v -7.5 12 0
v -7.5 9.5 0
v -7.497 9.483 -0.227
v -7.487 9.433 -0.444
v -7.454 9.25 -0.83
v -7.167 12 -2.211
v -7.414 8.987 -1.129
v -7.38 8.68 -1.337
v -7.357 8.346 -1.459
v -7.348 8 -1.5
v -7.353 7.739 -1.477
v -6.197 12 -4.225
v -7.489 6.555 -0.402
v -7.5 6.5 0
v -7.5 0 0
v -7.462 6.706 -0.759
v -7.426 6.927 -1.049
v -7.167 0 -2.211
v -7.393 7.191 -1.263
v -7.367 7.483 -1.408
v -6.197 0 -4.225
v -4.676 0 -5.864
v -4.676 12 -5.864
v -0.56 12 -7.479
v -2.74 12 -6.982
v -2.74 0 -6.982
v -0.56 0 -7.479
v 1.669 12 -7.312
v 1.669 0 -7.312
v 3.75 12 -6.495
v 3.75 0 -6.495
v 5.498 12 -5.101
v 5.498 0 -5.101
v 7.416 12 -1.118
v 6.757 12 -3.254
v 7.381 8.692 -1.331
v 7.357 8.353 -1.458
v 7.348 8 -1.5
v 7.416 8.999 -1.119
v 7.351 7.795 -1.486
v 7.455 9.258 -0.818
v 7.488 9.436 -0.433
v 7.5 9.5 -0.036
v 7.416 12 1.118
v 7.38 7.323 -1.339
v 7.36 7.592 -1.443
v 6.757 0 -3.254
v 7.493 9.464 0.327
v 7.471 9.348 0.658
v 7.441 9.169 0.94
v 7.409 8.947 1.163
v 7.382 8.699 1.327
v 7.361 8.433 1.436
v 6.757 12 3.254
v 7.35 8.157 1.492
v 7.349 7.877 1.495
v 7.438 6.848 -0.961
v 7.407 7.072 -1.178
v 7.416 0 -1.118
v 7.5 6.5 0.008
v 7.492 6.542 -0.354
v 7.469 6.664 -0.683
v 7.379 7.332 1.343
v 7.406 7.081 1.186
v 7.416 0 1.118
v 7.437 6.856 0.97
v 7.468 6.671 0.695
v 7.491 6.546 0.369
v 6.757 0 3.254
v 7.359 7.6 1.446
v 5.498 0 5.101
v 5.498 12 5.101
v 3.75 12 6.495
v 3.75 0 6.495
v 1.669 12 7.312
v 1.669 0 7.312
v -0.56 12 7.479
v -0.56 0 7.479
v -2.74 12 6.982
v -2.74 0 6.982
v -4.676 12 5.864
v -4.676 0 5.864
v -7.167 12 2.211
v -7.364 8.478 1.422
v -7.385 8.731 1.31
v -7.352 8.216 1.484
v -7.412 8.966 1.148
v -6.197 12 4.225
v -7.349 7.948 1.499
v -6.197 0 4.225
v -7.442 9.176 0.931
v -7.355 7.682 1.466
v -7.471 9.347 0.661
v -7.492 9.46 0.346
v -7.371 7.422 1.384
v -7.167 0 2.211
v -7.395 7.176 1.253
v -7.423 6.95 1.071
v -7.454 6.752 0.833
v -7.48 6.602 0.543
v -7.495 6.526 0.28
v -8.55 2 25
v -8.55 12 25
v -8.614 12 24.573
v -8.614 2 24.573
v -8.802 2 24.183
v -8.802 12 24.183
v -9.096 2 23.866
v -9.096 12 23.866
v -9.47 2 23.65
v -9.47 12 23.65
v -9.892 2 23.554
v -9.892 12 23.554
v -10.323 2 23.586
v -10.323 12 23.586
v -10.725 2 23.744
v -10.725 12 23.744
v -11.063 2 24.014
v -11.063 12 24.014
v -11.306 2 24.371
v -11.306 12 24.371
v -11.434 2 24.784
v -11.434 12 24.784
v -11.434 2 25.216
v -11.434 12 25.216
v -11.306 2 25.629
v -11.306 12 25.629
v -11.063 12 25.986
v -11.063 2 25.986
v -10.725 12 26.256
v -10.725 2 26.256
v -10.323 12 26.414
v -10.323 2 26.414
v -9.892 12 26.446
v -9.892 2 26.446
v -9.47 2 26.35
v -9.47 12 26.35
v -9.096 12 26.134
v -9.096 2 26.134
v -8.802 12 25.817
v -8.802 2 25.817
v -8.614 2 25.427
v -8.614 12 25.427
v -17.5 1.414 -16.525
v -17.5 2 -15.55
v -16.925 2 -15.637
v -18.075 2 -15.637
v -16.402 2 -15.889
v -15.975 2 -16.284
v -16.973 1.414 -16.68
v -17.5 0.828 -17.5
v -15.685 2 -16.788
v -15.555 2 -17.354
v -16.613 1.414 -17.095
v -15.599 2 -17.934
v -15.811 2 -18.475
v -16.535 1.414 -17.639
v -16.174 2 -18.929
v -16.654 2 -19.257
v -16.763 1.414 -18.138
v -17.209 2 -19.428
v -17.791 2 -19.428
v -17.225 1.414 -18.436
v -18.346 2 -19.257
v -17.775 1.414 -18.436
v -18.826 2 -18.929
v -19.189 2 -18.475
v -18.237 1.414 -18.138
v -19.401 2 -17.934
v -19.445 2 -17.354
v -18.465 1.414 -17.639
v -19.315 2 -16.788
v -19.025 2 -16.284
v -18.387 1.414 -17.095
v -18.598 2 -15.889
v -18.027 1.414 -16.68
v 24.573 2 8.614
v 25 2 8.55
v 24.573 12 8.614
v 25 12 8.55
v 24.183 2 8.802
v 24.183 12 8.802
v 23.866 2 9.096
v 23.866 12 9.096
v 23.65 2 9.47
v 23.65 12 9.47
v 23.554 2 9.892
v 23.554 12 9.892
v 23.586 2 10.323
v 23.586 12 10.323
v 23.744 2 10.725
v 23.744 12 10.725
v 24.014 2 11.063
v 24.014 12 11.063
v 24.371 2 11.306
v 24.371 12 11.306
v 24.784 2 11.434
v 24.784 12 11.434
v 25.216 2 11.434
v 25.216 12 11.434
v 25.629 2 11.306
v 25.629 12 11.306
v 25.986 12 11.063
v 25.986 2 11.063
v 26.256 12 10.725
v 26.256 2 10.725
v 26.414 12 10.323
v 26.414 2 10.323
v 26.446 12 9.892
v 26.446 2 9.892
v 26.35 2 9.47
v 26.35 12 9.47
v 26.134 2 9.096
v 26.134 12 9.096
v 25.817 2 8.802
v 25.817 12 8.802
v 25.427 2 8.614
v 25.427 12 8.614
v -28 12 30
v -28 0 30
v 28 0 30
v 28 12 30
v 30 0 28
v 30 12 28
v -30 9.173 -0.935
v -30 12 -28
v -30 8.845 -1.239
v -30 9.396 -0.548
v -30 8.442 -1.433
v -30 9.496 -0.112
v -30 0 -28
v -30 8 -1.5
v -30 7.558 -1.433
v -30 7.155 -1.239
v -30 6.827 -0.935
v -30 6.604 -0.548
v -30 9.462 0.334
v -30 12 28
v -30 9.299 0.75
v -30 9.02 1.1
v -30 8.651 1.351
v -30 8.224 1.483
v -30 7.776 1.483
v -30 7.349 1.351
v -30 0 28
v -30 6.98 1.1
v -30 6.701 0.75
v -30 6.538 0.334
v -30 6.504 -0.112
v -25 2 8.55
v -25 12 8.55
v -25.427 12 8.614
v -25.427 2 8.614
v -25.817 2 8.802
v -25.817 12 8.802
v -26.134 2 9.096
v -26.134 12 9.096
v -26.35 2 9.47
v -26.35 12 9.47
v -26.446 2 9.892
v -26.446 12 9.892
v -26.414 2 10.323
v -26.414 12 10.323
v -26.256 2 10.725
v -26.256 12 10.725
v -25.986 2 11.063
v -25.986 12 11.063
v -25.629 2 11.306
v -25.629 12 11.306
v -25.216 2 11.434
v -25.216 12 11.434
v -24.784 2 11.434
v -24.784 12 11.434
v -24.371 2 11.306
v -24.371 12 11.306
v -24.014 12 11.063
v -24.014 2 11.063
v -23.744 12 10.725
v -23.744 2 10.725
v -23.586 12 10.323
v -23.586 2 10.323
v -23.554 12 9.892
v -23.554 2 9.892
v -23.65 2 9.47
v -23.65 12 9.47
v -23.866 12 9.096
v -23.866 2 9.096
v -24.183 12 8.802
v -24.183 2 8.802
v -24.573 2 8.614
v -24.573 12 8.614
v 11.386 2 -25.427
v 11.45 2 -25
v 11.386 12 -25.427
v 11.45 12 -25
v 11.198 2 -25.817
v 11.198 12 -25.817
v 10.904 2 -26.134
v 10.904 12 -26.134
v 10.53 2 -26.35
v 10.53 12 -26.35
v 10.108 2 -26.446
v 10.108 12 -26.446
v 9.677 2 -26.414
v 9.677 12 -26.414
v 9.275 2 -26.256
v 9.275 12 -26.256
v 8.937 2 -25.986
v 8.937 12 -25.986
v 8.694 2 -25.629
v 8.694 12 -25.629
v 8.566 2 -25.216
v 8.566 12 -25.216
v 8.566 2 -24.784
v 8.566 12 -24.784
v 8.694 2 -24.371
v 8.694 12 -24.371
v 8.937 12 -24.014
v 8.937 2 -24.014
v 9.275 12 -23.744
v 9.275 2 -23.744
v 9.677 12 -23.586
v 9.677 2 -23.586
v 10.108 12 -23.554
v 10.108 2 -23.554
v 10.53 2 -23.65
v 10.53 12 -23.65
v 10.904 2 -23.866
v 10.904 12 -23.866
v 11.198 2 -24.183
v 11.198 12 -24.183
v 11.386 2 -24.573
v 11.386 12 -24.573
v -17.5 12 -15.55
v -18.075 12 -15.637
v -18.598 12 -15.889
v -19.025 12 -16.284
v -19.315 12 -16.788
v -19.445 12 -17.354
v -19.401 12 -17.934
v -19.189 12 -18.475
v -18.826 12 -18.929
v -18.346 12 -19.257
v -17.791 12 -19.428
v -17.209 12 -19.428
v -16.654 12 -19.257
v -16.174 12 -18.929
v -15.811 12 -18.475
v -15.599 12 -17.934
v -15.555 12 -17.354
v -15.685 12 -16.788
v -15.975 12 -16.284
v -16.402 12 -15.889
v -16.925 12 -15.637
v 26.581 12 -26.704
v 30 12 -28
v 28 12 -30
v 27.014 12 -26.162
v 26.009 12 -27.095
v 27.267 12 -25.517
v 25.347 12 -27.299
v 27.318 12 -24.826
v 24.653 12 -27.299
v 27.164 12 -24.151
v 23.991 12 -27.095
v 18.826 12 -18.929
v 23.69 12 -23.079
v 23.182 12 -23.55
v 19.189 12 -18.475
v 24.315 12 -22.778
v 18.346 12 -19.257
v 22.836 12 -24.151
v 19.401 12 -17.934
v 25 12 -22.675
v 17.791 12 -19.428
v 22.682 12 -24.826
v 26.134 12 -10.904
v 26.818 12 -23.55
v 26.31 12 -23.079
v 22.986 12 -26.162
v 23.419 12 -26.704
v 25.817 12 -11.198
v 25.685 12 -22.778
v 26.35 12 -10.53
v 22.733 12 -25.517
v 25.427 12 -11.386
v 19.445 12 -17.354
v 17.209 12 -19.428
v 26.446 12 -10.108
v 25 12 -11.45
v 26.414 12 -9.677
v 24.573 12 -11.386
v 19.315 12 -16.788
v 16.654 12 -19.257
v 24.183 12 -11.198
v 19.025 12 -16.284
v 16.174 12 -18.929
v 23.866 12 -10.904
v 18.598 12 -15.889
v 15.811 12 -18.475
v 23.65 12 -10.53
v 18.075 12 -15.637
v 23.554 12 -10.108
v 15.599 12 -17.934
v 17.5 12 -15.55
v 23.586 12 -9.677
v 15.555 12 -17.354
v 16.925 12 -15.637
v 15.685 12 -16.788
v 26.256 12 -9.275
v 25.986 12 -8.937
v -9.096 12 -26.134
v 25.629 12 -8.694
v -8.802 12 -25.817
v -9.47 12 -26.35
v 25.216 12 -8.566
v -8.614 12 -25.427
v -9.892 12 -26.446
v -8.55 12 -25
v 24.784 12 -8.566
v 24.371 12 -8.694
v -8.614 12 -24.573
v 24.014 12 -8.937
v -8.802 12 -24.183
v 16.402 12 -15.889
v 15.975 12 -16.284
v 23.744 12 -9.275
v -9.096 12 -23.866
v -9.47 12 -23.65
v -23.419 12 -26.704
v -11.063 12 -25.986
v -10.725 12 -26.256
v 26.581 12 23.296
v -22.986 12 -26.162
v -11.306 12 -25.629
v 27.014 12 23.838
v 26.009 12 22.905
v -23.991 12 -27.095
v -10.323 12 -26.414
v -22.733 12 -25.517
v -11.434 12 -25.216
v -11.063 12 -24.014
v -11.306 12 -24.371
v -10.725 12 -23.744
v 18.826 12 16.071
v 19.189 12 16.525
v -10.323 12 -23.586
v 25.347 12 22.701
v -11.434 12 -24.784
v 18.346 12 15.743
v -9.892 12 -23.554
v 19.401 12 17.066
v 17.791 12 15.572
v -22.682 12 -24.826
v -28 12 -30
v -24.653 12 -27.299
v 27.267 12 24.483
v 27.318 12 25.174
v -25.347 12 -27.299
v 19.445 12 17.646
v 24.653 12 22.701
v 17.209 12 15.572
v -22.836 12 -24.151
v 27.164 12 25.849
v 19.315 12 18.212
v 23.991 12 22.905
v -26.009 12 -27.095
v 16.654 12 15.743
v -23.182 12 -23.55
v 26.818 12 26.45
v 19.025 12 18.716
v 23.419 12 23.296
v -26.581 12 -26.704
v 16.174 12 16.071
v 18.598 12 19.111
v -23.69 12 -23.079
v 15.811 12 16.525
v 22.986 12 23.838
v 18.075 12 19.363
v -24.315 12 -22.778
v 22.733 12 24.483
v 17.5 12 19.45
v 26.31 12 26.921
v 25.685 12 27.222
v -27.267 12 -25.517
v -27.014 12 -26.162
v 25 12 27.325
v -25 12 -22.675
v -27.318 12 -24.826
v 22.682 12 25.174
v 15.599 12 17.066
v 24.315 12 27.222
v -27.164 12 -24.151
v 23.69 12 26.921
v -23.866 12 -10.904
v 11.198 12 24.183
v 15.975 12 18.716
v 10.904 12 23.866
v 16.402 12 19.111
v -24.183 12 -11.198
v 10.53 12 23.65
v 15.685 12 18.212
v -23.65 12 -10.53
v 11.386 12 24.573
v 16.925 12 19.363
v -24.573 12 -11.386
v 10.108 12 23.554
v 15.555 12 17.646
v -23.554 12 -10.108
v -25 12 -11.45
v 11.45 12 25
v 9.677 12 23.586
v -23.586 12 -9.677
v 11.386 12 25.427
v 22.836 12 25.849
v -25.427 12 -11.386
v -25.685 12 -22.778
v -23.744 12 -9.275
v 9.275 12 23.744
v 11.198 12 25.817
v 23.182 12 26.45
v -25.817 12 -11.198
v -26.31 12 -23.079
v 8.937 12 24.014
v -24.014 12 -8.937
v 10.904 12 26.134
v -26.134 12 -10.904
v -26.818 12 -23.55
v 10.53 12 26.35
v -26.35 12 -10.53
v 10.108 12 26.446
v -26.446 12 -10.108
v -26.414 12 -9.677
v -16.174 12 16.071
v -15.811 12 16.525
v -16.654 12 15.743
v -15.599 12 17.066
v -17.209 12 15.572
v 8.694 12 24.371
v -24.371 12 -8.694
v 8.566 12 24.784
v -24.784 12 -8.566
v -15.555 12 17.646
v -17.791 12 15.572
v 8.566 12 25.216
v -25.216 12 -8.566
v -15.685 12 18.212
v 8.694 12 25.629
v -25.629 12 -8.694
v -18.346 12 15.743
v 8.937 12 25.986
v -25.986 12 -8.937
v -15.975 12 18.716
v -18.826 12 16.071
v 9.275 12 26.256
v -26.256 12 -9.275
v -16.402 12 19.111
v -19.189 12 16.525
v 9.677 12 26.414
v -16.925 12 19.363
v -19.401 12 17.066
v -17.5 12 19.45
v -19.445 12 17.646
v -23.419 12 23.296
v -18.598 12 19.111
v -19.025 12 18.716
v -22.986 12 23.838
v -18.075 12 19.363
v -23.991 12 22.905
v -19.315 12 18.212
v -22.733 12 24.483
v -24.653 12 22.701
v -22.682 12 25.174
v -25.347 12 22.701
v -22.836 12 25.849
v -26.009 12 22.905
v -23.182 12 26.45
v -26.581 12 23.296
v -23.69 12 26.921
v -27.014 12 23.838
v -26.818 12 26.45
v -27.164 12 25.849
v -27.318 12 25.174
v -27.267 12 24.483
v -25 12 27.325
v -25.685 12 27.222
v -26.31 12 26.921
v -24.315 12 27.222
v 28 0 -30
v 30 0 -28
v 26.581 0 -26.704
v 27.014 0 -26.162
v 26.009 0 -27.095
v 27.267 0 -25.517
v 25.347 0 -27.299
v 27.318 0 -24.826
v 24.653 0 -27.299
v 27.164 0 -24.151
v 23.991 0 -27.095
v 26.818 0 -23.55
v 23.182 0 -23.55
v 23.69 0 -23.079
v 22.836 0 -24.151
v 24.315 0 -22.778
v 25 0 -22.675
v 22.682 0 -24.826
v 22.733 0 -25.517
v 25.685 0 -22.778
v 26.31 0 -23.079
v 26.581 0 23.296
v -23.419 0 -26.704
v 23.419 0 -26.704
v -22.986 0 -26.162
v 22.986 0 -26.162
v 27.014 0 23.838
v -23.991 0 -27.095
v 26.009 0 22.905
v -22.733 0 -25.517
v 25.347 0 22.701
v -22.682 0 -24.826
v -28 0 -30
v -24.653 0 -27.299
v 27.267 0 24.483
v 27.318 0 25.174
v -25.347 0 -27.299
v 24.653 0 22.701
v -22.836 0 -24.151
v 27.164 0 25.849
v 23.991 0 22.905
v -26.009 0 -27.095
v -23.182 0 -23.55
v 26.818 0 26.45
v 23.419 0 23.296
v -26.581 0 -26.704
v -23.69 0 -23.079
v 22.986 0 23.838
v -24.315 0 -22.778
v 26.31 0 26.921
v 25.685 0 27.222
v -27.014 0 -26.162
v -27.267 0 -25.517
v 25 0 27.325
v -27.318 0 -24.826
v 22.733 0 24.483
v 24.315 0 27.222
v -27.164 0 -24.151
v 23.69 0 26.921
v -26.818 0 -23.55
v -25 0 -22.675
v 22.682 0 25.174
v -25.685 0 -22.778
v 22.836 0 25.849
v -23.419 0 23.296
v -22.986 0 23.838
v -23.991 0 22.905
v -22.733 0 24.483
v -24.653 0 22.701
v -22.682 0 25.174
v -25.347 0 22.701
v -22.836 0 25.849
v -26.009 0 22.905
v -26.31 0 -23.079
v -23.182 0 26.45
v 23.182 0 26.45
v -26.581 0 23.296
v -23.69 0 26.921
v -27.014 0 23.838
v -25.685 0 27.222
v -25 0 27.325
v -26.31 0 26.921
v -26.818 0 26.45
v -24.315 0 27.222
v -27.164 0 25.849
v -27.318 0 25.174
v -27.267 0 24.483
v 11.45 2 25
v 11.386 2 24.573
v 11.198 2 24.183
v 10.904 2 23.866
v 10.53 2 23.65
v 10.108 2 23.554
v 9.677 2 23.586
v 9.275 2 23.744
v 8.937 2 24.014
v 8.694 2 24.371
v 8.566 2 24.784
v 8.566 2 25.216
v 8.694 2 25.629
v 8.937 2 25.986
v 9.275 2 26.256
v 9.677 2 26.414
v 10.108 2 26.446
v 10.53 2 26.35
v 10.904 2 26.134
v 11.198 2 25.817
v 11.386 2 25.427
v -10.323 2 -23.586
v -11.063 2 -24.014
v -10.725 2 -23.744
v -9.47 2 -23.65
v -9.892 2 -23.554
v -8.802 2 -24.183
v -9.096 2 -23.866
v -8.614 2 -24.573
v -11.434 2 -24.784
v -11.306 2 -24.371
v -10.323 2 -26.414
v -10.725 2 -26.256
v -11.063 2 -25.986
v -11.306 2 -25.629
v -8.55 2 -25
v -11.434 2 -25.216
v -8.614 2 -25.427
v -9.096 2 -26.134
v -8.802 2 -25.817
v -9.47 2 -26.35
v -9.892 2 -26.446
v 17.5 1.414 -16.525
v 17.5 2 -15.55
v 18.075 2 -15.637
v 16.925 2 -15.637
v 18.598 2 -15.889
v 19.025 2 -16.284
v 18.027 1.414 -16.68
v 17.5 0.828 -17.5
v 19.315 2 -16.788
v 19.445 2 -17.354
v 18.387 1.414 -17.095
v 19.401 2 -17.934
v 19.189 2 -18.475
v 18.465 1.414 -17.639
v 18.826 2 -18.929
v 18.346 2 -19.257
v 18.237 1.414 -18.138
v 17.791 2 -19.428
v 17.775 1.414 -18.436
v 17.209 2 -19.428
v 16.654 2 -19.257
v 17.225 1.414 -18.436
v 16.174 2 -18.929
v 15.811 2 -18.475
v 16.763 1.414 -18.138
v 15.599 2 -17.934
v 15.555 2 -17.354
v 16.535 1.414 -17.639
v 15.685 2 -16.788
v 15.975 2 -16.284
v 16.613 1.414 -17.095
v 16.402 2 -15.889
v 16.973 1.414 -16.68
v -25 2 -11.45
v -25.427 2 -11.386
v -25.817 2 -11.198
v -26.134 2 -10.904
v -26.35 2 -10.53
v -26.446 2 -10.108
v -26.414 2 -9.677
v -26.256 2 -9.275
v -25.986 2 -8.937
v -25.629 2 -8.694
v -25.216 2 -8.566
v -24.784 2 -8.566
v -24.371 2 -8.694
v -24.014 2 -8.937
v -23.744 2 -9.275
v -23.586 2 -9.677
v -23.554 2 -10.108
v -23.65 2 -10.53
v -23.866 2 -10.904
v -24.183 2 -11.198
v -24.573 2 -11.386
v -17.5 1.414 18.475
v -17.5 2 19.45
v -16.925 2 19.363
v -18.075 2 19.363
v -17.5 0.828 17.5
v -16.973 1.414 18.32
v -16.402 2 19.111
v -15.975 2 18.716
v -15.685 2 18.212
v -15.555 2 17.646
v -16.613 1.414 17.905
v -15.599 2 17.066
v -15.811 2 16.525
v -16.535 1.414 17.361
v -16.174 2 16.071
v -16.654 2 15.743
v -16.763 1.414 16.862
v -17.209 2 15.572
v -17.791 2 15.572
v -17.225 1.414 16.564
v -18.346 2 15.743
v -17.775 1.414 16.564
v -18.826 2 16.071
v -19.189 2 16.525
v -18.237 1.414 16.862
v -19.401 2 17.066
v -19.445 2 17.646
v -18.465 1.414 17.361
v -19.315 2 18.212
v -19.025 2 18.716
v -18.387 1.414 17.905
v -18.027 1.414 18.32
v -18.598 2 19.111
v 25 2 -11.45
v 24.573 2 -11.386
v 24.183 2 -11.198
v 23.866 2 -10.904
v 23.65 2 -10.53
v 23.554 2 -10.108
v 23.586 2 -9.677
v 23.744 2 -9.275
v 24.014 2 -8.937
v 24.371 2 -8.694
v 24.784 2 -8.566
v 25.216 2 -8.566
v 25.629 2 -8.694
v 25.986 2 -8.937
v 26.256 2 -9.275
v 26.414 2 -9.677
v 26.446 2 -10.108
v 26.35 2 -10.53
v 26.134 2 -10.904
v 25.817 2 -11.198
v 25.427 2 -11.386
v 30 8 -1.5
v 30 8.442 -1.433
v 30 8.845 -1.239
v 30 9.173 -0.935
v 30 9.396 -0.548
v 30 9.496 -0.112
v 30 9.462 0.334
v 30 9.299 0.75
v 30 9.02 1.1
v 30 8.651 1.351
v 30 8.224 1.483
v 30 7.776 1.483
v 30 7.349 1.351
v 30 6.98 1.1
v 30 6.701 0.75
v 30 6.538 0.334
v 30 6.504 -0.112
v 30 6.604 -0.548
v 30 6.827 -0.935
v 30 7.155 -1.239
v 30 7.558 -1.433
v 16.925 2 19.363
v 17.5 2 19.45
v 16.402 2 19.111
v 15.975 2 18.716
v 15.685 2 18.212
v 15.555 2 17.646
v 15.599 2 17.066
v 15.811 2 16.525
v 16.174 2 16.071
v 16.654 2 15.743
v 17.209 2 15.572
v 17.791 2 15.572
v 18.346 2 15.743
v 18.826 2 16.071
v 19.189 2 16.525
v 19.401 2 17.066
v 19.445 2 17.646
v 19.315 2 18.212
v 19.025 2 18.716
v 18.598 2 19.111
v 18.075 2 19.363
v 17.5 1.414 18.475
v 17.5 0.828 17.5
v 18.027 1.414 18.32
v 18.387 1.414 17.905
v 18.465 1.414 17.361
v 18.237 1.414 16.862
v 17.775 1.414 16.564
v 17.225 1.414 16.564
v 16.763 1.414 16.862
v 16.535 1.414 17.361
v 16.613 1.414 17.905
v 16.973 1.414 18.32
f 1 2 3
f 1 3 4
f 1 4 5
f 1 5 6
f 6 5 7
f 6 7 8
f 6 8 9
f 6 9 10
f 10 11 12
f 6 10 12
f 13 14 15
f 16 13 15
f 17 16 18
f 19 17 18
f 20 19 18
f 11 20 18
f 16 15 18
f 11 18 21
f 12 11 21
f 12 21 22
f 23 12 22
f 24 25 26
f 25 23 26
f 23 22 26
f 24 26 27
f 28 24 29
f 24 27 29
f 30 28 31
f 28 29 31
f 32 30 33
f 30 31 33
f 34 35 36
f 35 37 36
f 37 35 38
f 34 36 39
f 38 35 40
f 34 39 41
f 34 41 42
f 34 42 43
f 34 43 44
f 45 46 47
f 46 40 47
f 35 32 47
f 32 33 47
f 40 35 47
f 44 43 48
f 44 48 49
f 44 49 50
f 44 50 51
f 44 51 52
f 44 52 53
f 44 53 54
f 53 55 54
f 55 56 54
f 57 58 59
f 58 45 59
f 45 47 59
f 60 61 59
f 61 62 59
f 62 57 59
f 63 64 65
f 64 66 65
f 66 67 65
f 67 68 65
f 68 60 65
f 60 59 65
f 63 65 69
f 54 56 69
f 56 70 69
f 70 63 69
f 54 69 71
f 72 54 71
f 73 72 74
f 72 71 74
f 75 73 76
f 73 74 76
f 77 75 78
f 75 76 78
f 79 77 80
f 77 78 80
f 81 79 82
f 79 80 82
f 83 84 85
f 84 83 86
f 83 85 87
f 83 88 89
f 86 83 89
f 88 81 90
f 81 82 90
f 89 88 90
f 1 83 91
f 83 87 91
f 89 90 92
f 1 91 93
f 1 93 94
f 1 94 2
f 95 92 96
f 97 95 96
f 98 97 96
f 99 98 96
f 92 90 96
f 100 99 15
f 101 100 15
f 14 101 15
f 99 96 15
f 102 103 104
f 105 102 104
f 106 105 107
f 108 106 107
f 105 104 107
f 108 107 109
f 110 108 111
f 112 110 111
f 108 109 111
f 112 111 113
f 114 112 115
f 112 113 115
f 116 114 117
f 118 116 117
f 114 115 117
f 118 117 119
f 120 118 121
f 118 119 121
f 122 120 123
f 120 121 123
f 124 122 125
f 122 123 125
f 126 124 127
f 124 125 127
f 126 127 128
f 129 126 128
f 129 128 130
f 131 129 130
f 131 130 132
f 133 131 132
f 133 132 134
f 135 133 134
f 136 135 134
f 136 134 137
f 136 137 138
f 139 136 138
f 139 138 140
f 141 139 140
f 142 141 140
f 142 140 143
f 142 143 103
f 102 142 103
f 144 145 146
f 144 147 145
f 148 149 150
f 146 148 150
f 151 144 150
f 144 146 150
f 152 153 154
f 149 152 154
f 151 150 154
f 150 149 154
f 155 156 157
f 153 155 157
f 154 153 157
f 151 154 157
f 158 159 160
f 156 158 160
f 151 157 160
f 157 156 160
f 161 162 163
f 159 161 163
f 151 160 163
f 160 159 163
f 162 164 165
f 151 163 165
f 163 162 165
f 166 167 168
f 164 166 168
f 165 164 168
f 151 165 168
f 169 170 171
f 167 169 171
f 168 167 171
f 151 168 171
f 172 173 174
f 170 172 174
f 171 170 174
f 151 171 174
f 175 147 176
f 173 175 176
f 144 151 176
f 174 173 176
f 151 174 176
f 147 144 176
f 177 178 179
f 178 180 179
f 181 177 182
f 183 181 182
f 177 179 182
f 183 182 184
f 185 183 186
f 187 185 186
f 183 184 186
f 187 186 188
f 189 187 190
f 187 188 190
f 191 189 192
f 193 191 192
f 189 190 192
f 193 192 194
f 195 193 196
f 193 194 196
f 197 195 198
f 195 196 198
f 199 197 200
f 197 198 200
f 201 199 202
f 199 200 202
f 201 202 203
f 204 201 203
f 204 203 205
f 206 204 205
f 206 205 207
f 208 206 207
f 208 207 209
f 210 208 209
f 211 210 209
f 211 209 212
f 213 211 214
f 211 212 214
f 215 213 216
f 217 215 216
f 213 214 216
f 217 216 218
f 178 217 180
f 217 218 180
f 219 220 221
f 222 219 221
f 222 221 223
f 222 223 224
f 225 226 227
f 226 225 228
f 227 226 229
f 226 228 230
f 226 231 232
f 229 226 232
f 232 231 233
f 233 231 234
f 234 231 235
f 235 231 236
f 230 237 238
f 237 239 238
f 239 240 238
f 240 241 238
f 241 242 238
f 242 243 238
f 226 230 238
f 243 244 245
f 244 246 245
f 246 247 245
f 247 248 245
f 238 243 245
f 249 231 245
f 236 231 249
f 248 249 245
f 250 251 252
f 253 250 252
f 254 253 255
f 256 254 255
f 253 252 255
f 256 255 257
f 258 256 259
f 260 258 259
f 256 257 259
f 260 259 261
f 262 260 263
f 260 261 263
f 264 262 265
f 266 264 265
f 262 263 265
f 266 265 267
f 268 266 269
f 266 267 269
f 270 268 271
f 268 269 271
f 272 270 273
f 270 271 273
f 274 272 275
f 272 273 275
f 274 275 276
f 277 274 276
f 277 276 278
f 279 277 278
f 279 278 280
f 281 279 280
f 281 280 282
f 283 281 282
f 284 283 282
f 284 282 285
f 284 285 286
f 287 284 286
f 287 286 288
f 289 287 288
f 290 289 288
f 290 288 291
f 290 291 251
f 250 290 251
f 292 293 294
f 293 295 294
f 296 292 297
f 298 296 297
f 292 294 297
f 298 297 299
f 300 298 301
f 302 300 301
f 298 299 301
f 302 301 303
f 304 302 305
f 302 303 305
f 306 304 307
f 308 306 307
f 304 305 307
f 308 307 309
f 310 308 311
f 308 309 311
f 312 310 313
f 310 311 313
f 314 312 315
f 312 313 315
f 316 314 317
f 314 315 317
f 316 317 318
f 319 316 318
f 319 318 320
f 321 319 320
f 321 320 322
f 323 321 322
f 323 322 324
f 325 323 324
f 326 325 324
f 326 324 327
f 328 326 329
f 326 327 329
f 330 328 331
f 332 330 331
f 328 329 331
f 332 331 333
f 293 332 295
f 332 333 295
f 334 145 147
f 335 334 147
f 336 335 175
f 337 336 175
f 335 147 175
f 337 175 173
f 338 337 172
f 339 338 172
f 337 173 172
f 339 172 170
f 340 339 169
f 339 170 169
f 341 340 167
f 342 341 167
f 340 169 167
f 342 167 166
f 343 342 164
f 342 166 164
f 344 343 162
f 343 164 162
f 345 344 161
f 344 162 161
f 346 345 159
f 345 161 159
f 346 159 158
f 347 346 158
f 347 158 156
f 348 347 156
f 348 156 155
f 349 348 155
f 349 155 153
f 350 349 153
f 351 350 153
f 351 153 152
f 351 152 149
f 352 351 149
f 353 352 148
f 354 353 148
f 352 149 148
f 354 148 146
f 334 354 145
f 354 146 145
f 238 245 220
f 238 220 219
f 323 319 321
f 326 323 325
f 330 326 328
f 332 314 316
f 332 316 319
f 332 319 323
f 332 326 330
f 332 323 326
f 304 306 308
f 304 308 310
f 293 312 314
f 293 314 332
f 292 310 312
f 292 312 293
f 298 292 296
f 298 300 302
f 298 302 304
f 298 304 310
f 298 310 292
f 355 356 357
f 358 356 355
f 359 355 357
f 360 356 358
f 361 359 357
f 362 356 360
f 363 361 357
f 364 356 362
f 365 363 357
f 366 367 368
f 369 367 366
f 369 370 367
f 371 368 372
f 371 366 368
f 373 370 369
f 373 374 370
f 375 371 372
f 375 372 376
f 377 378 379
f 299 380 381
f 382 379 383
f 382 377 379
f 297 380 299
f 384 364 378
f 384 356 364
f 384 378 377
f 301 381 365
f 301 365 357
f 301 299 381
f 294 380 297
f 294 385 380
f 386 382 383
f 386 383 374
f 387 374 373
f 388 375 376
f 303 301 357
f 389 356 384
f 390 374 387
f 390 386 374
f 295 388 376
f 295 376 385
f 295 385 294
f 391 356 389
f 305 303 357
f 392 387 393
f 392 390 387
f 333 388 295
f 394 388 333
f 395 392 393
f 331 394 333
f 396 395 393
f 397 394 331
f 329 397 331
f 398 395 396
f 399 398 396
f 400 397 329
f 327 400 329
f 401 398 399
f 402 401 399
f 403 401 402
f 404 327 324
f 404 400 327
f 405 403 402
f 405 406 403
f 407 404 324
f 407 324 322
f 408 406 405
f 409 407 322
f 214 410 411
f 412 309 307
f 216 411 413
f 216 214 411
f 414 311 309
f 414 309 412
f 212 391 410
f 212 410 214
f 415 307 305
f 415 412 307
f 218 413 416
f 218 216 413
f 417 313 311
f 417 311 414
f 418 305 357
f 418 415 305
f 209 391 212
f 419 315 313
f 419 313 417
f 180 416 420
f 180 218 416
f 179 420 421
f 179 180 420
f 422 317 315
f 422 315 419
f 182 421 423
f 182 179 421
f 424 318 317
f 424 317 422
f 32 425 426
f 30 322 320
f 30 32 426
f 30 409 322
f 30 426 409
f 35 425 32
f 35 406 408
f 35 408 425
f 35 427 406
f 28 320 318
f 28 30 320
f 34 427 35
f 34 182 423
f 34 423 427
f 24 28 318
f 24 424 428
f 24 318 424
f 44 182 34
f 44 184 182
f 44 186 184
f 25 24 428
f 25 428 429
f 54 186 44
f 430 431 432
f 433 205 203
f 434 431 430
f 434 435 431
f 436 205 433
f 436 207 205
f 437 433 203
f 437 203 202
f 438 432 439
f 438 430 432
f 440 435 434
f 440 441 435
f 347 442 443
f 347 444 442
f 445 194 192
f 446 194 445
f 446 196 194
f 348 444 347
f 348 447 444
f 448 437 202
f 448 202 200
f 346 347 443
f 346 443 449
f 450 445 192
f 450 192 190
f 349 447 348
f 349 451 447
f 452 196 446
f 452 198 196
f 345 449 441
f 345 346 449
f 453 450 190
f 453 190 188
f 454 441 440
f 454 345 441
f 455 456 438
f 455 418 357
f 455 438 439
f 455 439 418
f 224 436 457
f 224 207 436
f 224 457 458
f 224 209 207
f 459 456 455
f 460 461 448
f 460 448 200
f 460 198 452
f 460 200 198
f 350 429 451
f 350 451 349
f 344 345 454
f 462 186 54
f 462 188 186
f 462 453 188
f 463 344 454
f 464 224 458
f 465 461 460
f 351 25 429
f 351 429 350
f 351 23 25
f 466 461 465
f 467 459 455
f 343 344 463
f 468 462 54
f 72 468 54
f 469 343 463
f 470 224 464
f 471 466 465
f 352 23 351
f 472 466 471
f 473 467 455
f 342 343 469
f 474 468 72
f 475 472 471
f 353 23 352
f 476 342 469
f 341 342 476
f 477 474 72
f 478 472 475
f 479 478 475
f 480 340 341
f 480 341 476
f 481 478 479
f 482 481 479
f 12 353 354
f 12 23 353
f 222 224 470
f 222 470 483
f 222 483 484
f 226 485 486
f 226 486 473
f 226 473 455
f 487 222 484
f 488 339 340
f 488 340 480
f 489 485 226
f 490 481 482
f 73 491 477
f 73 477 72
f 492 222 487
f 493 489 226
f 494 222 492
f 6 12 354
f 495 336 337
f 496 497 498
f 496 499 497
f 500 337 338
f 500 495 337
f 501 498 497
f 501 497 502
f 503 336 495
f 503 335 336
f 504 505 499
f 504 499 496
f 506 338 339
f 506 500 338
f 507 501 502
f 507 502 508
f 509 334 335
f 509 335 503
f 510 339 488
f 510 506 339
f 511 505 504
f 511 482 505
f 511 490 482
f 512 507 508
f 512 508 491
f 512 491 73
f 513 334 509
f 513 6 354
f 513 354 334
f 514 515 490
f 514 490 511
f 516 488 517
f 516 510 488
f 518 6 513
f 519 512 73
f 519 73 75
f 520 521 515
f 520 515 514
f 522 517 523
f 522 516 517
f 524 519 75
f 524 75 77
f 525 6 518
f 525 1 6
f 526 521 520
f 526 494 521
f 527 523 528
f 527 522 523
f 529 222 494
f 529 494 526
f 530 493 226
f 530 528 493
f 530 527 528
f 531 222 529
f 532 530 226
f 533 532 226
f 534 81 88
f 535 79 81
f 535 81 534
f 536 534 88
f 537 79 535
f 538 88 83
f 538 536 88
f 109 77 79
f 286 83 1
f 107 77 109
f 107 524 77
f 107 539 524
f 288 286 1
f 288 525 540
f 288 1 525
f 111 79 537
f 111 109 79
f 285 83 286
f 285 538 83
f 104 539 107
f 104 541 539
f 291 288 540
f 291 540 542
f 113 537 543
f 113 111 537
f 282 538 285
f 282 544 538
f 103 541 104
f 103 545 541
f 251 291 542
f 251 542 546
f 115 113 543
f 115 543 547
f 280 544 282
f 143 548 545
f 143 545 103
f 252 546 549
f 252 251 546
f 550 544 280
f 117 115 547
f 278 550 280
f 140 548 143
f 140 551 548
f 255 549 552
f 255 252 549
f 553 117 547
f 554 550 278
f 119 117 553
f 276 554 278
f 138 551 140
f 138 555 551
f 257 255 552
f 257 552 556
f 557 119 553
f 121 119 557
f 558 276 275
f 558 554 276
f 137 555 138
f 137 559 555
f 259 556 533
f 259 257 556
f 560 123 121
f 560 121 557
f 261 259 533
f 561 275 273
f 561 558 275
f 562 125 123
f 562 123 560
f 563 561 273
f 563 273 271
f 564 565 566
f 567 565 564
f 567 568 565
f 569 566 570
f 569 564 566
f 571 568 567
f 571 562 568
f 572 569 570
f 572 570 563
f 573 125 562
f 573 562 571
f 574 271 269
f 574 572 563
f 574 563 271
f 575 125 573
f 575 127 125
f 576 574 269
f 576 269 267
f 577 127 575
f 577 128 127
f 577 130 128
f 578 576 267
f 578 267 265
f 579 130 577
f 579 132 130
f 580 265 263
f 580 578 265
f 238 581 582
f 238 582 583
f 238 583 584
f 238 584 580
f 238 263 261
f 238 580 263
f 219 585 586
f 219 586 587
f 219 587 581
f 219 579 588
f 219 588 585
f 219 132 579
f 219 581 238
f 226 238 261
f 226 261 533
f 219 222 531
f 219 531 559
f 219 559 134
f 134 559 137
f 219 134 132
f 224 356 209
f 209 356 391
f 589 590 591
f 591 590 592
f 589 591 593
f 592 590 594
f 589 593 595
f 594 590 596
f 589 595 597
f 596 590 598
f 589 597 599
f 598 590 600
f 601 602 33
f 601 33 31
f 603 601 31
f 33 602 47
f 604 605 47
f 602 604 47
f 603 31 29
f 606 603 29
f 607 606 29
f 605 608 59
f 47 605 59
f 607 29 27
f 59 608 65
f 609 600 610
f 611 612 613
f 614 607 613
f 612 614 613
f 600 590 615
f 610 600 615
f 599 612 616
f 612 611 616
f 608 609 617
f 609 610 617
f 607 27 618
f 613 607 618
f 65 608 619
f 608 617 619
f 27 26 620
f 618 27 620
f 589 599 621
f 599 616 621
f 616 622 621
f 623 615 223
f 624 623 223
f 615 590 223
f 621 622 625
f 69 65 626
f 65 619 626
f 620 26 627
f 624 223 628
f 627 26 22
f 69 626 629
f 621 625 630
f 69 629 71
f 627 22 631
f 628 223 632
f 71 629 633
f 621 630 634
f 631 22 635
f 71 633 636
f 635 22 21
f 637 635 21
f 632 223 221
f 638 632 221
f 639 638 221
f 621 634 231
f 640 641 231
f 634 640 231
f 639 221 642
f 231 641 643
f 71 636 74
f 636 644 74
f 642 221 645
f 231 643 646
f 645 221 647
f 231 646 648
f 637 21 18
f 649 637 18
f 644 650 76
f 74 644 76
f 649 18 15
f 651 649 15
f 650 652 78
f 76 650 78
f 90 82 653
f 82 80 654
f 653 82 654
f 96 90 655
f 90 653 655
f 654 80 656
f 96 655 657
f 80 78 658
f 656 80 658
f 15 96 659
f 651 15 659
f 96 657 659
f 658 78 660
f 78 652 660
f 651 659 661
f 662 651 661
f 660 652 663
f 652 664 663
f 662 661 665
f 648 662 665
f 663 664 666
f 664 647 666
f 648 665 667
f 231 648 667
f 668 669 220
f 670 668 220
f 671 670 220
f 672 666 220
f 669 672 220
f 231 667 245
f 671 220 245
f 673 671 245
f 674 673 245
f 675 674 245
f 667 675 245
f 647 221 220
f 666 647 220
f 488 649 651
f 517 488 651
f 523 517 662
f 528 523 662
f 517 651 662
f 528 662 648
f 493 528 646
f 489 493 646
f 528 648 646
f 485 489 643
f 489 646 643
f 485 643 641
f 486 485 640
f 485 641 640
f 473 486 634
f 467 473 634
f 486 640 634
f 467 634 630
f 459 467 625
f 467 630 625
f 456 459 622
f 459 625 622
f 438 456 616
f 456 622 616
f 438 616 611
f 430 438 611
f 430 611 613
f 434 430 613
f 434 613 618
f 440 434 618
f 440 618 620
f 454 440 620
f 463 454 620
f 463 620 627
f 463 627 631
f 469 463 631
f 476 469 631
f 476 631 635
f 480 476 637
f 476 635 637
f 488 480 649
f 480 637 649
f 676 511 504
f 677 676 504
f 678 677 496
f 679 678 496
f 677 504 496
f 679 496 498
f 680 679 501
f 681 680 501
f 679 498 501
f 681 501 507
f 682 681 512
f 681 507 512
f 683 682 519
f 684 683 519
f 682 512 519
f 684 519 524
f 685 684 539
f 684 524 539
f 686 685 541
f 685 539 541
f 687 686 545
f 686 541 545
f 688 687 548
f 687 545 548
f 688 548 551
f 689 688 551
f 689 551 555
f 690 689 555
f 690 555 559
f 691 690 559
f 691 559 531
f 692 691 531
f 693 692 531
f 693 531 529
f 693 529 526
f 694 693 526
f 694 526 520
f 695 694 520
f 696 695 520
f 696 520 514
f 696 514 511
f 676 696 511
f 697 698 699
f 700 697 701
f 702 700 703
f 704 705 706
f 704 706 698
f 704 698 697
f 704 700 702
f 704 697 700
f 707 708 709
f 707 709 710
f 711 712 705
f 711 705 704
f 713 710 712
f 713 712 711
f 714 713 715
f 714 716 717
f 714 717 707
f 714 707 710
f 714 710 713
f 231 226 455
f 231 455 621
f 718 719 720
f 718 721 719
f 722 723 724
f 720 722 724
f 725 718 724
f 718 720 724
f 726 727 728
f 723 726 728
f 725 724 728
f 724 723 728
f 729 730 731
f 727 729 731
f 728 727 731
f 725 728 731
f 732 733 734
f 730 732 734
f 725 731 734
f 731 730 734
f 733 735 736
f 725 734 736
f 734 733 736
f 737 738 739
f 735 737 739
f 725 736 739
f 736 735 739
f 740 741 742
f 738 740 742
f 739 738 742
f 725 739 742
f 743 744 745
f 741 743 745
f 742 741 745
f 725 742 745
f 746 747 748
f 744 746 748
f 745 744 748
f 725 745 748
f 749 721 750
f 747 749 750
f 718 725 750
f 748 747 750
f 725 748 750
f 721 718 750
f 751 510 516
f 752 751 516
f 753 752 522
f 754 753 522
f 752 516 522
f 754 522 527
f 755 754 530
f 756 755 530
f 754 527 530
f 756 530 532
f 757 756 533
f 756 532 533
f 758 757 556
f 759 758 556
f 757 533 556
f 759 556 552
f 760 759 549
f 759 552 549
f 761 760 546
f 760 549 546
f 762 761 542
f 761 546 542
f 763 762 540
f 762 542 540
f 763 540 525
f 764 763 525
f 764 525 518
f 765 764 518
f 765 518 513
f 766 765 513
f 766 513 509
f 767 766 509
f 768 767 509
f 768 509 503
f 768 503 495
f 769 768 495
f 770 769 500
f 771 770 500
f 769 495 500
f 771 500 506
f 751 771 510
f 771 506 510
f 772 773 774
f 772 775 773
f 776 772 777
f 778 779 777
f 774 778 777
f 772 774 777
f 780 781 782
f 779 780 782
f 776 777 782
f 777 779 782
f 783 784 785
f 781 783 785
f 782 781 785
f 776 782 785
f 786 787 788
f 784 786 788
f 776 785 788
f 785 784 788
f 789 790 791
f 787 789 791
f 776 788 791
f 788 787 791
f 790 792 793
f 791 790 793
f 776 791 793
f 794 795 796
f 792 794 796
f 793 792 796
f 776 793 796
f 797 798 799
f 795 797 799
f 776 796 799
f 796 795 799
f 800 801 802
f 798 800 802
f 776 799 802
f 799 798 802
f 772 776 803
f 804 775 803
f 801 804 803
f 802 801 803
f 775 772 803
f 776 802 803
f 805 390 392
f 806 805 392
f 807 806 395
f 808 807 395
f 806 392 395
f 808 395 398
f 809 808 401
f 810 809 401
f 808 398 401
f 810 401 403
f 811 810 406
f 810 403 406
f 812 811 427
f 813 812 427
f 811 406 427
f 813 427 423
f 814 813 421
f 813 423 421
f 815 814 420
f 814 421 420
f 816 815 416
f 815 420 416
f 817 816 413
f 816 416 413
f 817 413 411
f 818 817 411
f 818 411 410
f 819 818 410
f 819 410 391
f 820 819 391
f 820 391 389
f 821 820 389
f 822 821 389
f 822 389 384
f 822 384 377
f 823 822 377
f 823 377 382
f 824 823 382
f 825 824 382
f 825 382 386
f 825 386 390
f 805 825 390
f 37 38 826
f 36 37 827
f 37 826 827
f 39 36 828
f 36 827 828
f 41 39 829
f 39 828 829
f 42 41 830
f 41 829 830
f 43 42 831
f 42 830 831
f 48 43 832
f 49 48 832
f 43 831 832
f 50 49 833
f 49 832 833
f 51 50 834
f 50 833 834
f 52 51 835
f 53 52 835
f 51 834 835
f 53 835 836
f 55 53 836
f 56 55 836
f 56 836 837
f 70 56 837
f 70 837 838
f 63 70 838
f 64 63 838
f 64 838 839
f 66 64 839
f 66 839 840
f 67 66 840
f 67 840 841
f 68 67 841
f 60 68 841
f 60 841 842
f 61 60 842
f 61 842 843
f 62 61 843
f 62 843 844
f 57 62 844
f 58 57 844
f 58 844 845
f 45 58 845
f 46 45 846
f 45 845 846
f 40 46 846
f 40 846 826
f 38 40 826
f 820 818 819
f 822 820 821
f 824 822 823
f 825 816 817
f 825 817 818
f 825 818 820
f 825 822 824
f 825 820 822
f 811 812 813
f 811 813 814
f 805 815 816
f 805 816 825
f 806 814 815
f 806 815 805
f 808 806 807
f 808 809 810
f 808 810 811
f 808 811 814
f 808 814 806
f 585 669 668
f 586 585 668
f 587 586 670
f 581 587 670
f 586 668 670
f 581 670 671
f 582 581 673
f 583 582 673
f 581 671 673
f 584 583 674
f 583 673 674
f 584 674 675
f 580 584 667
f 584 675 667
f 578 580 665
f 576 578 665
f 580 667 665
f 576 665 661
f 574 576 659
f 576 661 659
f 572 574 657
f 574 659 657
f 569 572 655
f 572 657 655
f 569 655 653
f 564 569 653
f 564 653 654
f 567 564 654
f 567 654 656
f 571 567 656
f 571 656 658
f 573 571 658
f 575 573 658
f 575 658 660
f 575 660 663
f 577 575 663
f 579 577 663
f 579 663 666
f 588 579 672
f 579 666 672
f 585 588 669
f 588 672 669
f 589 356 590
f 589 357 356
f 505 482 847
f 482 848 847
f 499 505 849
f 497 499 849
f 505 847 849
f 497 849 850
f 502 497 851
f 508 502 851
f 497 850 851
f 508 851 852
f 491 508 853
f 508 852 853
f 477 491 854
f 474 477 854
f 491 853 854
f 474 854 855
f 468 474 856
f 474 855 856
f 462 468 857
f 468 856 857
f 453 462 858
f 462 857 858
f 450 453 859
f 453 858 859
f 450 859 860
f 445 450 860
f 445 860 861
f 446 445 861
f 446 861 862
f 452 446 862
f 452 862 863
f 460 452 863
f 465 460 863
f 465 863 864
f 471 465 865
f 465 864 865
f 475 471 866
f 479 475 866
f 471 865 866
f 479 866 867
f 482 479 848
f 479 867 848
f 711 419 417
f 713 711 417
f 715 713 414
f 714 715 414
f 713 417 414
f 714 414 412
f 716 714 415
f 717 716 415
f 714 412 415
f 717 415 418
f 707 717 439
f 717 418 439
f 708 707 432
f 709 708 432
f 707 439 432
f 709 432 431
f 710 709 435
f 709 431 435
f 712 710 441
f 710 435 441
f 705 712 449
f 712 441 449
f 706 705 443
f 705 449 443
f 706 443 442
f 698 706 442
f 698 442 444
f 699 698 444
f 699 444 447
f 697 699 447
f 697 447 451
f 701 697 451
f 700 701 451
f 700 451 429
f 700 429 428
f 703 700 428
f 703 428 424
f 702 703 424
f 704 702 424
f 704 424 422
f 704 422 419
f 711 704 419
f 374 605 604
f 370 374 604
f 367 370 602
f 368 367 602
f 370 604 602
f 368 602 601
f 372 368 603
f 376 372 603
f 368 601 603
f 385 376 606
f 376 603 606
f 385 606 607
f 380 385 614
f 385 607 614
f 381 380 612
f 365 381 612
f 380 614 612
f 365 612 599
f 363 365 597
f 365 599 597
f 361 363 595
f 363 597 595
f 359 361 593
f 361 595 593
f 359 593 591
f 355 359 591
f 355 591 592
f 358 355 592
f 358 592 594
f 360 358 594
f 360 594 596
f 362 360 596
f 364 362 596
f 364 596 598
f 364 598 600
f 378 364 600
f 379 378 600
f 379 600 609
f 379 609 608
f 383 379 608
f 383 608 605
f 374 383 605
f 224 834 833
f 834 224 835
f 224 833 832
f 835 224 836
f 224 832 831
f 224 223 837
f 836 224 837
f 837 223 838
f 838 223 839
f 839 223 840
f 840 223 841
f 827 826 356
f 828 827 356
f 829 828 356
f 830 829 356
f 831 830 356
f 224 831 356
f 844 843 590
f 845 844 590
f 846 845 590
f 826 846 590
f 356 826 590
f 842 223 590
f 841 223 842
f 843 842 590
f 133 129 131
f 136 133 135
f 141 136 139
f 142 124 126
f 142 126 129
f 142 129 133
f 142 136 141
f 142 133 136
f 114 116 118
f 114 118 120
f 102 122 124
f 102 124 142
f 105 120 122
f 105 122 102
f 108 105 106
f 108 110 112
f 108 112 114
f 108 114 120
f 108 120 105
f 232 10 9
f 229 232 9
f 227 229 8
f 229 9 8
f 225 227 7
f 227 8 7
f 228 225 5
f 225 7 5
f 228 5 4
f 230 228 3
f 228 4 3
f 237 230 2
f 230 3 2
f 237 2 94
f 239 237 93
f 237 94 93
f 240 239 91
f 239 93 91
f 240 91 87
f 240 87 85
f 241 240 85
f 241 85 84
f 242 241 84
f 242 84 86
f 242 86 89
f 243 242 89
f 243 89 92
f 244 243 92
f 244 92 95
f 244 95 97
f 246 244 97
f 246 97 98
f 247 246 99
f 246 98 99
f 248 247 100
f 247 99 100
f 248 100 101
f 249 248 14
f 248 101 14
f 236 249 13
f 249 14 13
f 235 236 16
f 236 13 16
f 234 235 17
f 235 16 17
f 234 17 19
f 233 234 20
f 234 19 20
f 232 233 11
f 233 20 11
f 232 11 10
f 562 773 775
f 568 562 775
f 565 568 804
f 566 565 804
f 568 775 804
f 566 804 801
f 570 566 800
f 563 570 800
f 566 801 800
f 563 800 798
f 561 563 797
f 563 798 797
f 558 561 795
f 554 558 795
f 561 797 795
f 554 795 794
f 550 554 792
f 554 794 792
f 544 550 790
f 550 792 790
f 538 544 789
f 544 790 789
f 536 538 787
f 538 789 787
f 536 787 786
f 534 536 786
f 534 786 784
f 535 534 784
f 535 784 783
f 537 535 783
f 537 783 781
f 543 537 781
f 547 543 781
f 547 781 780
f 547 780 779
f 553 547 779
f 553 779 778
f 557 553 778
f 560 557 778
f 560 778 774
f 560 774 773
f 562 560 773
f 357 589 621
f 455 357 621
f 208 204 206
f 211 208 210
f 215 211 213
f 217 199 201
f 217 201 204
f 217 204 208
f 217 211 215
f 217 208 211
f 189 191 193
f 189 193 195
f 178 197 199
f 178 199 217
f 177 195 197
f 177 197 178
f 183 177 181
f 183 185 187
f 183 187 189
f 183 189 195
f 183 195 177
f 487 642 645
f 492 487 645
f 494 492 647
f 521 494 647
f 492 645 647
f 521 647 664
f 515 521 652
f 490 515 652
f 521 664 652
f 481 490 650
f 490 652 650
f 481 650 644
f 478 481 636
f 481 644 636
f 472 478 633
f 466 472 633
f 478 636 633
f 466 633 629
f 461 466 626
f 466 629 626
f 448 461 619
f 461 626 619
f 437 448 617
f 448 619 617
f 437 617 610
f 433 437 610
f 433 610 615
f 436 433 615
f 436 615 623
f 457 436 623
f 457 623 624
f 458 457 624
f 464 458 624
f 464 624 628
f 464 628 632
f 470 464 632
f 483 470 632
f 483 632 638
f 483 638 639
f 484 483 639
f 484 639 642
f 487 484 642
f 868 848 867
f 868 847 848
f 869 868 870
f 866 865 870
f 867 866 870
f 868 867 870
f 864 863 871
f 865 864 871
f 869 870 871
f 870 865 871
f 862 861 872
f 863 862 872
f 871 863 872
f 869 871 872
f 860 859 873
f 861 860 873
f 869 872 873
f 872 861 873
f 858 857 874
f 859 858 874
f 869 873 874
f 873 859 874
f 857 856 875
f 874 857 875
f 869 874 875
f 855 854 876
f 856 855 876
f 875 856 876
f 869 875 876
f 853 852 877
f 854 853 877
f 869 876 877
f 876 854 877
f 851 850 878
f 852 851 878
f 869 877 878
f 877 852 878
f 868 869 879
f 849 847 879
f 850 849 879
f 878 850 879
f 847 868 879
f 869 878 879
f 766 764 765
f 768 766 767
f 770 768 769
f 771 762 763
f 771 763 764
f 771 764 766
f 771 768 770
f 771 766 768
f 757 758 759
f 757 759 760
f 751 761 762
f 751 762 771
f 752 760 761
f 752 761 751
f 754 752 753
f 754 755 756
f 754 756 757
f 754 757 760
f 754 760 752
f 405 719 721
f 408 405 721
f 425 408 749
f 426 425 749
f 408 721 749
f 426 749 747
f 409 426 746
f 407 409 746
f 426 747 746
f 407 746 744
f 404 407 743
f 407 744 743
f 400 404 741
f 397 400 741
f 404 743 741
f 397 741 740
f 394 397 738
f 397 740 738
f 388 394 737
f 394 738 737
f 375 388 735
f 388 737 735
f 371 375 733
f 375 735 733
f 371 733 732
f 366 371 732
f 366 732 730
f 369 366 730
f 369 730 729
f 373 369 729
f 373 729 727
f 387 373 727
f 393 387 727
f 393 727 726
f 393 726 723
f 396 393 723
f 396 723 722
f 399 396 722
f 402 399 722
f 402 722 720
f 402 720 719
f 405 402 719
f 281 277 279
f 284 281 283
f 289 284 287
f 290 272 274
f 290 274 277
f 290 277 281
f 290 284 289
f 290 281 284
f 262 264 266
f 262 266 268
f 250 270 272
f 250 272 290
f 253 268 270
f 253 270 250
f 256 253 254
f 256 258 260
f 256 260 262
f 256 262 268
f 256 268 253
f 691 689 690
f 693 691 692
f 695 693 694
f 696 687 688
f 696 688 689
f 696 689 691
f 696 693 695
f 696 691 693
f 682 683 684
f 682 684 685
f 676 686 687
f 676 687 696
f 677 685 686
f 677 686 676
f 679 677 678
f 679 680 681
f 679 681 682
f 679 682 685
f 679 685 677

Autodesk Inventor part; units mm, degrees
ref_plane "YZ Plane" through (0, 0, 0) normal (1, 0, 0) x (0, 1, 0)
ref_plane "XZ Plane" through (0, 0, 0) normal (0, 1, 0) x (-1, 0, 0)
ref_plane "XY Plane" through (0, 0, 0) normal (0, 0, 1) x (1, 0, 0)
sketch "Sketch1" plane through (0, 0, 0) normal (0, 1, 0) x (-1, 0, 0)
  line L0 (-30, -30) -> (30, -30)
  line L1 (30, -30) -> (30, 30)
  line L2 (30, 30) -> (-30, 30)
  line L3 (-30, 30) -> (-30, -30)
  line L4 (-30, -30) -> (30, 30) construction
  line L5 (30, -30) -> (-30, 30) construction
  circle A0 centre (0, 0) radius 7.5
  circle A1 centre (-25, 25) radius 1.95 projected
  circle A2 centre (0, 25) radius 1.95 projected
  circle A3 centre (0, 25) radius 1.95 projected
  circle A4 centre (25, 0) radius 1.95 projected
  circle A5 centre (25, -25) radius 1.95 projected
  circle A6 centre (-25, 25) radius 1.95 projected
  circle A7 centre (-25, -25) radius 1.95 projected
  circle A8 centre (25, 25) radius 1.95 projected
  circle A9 centre (-25, 0) radius 1.95 projected
  circle A10 centre (0, -25) radius 1.95 projected
  line L6 (28, 30) -> (30, 28) projected
  line L7 (30, 28) -> (30, -28) projected
  line L8 (30, -28) -> (28, -30) projected
  line L9 (28, -30) -> (-28, -30) projected
  line L10 (-28, -30) -> (-30, -28) projected
  line L11 (-30, -28) -> (-30, 28) projected
  line L12 (-30, 28) -> (-28, 30) projected
  line L13 (-28, 30) -> (28, 30) projected
  dimension "d0" = 60
  dimension "d1" = 60
  dimension "d13" = 15
extrude "Extrusion1" add sketch "Sketch1" along normal blind 12 contours L3 L10 L0 | L10 L3 L12 L2 L6 L1 L8 L0 | L8 L1 L0 | L3 L2 L12 | L6 L2 L1 | A1 | A2 | A4 | A5 | A7 | A8 | A9 | A10
sketch "Sketch2" plane through (0, 12, 0) normal (0, 1, 0) x (1, 0, 0)
  line L0 (30, 30) -> (-30, 30) projected
  line L1 (-30, 30) -> (-30, -30) projected
  line L2 (-30, -30) -> (30, -30) projected
  line L3 (30, -30) -> (30, 30) projected
  line L4 (17.5, -17.5) -> (-17.5, -17.5)
  line L5 (-17.5, -17.5) -> (-17.5, 17.5)
  line L6 (-17.5, 17.5) -> (17.5, 17.5)
  line L7 (17.5, 17.5) -> (17.5, -17.5)
  line L8 (17.5, -17.5) -> (-17.5, 17.5) construction
  line L9 (-17.5, -17.5) -> (17.5, 17.5) construction
  line L10 (0, -17.5) -> (0, 17.5)
  line L11 (-17.5, 0) -> (17.5, 0)
  point P0 (0, 0)
  dimension "d4" = 35
  dimension "d5" = 35
hole "Hole1" at (-17.5, 12, 17.5) at (-17.5, 12, -17.5) at (17.5, 12, -17.5) at (17.5, 12, 17.5) direction (0, -1, 0) diameter 3.9 depth 10 tip angle 118
chamfer "Chamfer1" distance 2 angle 45 4 edges at (30, 6, 30) (30, 6, -30) (-30, 6, -30) (-30, 6, 30)
sketch "Sketch3" plane through (0, 12, 0) normal (0, 1, 0) x (1, 0, 0)
  line L0 (-28, -30) -> (-30, -28) projected
  line L1 (-28, -30) -> (28, -30) projected
  line L2 (30, -28) -> (28, -30) projected
  line L3 (30, -28) -> (30, 28) projected
  line L4 (28, 30) -> (30, 28) projected
  line L5 (28, 30) -> (-28, 30) projected
  line L6 (-30, 28) -> (-28, 30) projected
  line L7 (-30, 28) -> (-30, -28) projected
  circle A0 centre (17.5, 17.5) radius 1.95 projected
  circle A1 centre (-17.5, -17.5) radius 1.95 projected
  circle A2 centre (-17.5, 17.5) radius 1.95 projected
  circle A3 centre (17.5, -17.5) radius 1.95 projected
  circle A4 centre (0, 0) radius 7.5 projected
  line L8 (25, -25) -> (-25, -25)
  line L9 (-25, -25) -> (-25, 25)
  line L10 (-25, 25) -> (25, 25)
  line L11 (25, 25) -> (25, -25)
  line L12 (25, -25) -> (-25, 25) construction
  line L13 (-25, -25) -> (25, 25) construction
  dimension "d17" = 50
  dimension "d18" = 50
hole "Hole2" at (-25, 12, -25) at (25, 12, -25) at (25, 12, 25) at (-25, 12, 25) direction (0, -1, 0) diameter 4.65 end through all
sketch "Sketch4" plane through (30, 0, 28) normal (1, 0, 0) x (0, 0, -1)
  line L0 (56, 12) -> (56, 0) projected
  line L1 (0, 12) -> (56, 12) projected
  line L2 (0, 0) -> (0, 12) projected
  line L3 (0, 0) -> (56, 0) projected
  circle A0 centre (28, 8) radius 1.5
  line L4 (-2, 12) -> (-2, 0) projected
  point P0 (28, 0)
  dimension "d26" = 3
  dimension "d27" = 4
  dimension "d28" = 30
extrude "Extrusion2" cut sketch "Sketch4" against normal through all contours A0
sketch "Sketch5" plane through (0, 12, 0) normal (0, 1, 0) x (1, 0, 0)
  circle A0 centre (25, -25) radius 2.325 projected
  circle A1 centre (-25, -25) radius 2.325 projected
  circle A2 centre (25, 25) radius 2.325 projected
  circle A3 centre (-25, 25) radius 2.325 projected
  circle A4 centre (10, -25) radius 1.45
  circle A5 centre (-10, -25) radius 1.45
  circle A6 centre (10, 25) radius 1.45
  circle A7 centre (-10, 25) radius 1.45
  point P0 (0, 0)
  dimension "d31" = 2.9
  dimension "d32" = 2.9
  dimension "d33" = 15
  dimension "d34" = 15
  dimension "d35" = 2.9
  dimension "d36" = 2.9
extrude "Extrusion3" cut sketch "Sketch5" against normal blind 10 contours A4 | A5 | A6 | A7
pattern_circular "Circular Pattern1" count 2 over 90 about axis through (0, 0, 0) along (0, 1, 0) of "Extrusion3"
properties part number "00_XY_stage-CHUO_SEIKI_LD-647-R1-Top"
